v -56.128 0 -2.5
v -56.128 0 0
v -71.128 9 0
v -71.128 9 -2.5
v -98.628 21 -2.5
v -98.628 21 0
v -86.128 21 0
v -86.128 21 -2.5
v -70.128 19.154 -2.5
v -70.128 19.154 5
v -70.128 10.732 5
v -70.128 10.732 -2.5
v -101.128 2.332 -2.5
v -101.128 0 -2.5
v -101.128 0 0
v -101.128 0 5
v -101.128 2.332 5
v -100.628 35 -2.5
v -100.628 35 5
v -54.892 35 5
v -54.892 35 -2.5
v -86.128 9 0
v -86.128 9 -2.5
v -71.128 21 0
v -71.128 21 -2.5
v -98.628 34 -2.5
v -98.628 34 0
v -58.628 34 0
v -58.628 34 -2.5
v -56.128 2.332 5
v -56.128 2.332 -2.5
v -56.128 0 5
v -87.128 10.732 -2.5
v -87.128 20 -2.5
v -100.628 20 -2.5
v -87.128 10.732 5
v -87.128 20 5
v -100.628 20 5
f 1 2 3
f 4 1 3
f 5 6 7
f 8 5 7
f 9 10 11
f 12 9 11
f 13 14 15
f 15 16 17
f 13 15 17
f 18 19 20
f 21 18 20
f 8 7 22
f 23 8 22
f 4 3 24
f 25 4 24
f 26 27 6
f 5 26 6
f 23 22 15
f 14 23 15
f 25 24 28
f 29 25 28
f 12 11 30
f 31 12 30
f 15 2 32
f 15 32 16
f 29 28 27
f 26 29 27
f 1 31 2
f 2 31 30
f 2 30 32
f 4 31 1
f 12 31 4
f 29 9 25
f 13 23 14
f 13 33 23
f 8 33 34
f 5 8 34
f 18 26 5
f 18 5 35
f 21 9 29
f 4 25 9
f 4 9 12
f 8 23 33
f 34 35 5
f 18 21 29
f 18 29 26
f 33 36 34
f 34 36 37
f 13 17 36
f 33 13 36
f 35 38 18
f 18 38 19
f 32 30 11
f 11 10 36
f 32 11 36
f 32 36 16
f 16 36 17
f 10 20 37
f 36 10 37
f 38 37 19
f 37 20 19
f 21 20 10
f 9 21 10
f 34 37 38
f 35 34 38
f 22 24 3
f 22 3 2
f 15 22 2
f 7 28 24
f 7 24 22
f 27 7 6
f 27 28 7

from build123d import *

# Parameters (mm, degrees)
EXTRUDE_1_DEPTH = 5
EXTRUDE_2_DEPTH = 7.5


with BuildPart() as part:
    # 草图1 → 凸台-拉伸1 (new body)
    with BuildSketch(Plane.XY):
        Polygon((-101.128293069, 0), (-86.128293069, 9), (-86.128293069, 21), (-98.628293069, 21), (-98.628293069, 34), (-58.628293069, 34), (-71.128293069, 21), (-71.128293069, 9), (-56.128293069, 0), align=None)
    extrude(amount=EXTRUDE_1_DEPTH)

    # 草图2 → 凸台-拉伸2 (add)
    with BuildSketch(Plane(origin=(0, 0, 5), x_dir=(-1, 0, 0), z_dir=(0, 0, -1))):
        Polygon((54.8921871, 35), (70.128293069, 19.154449793), (70.128293069, 10.732380758), (56.128293069, 2.332380758), (56.128293069, 0), (71.128293069, 9), (71.128293069, 21), (58.628293069, 34), (98.628293069, 34), (98.628293069, 21), (86.128293069, 21), (86.128293069, 9), (101.128293069, 0), (101.128293069, 2.332380758), (87.128293069, 10.732380758), (87.128293069, 20), (100.628293069, 20), (100.628293069, 29), (100.628293069, 35), align=None)
    extrude(amount=EXTRUDE_2_DEPTH)


solid = part.part
